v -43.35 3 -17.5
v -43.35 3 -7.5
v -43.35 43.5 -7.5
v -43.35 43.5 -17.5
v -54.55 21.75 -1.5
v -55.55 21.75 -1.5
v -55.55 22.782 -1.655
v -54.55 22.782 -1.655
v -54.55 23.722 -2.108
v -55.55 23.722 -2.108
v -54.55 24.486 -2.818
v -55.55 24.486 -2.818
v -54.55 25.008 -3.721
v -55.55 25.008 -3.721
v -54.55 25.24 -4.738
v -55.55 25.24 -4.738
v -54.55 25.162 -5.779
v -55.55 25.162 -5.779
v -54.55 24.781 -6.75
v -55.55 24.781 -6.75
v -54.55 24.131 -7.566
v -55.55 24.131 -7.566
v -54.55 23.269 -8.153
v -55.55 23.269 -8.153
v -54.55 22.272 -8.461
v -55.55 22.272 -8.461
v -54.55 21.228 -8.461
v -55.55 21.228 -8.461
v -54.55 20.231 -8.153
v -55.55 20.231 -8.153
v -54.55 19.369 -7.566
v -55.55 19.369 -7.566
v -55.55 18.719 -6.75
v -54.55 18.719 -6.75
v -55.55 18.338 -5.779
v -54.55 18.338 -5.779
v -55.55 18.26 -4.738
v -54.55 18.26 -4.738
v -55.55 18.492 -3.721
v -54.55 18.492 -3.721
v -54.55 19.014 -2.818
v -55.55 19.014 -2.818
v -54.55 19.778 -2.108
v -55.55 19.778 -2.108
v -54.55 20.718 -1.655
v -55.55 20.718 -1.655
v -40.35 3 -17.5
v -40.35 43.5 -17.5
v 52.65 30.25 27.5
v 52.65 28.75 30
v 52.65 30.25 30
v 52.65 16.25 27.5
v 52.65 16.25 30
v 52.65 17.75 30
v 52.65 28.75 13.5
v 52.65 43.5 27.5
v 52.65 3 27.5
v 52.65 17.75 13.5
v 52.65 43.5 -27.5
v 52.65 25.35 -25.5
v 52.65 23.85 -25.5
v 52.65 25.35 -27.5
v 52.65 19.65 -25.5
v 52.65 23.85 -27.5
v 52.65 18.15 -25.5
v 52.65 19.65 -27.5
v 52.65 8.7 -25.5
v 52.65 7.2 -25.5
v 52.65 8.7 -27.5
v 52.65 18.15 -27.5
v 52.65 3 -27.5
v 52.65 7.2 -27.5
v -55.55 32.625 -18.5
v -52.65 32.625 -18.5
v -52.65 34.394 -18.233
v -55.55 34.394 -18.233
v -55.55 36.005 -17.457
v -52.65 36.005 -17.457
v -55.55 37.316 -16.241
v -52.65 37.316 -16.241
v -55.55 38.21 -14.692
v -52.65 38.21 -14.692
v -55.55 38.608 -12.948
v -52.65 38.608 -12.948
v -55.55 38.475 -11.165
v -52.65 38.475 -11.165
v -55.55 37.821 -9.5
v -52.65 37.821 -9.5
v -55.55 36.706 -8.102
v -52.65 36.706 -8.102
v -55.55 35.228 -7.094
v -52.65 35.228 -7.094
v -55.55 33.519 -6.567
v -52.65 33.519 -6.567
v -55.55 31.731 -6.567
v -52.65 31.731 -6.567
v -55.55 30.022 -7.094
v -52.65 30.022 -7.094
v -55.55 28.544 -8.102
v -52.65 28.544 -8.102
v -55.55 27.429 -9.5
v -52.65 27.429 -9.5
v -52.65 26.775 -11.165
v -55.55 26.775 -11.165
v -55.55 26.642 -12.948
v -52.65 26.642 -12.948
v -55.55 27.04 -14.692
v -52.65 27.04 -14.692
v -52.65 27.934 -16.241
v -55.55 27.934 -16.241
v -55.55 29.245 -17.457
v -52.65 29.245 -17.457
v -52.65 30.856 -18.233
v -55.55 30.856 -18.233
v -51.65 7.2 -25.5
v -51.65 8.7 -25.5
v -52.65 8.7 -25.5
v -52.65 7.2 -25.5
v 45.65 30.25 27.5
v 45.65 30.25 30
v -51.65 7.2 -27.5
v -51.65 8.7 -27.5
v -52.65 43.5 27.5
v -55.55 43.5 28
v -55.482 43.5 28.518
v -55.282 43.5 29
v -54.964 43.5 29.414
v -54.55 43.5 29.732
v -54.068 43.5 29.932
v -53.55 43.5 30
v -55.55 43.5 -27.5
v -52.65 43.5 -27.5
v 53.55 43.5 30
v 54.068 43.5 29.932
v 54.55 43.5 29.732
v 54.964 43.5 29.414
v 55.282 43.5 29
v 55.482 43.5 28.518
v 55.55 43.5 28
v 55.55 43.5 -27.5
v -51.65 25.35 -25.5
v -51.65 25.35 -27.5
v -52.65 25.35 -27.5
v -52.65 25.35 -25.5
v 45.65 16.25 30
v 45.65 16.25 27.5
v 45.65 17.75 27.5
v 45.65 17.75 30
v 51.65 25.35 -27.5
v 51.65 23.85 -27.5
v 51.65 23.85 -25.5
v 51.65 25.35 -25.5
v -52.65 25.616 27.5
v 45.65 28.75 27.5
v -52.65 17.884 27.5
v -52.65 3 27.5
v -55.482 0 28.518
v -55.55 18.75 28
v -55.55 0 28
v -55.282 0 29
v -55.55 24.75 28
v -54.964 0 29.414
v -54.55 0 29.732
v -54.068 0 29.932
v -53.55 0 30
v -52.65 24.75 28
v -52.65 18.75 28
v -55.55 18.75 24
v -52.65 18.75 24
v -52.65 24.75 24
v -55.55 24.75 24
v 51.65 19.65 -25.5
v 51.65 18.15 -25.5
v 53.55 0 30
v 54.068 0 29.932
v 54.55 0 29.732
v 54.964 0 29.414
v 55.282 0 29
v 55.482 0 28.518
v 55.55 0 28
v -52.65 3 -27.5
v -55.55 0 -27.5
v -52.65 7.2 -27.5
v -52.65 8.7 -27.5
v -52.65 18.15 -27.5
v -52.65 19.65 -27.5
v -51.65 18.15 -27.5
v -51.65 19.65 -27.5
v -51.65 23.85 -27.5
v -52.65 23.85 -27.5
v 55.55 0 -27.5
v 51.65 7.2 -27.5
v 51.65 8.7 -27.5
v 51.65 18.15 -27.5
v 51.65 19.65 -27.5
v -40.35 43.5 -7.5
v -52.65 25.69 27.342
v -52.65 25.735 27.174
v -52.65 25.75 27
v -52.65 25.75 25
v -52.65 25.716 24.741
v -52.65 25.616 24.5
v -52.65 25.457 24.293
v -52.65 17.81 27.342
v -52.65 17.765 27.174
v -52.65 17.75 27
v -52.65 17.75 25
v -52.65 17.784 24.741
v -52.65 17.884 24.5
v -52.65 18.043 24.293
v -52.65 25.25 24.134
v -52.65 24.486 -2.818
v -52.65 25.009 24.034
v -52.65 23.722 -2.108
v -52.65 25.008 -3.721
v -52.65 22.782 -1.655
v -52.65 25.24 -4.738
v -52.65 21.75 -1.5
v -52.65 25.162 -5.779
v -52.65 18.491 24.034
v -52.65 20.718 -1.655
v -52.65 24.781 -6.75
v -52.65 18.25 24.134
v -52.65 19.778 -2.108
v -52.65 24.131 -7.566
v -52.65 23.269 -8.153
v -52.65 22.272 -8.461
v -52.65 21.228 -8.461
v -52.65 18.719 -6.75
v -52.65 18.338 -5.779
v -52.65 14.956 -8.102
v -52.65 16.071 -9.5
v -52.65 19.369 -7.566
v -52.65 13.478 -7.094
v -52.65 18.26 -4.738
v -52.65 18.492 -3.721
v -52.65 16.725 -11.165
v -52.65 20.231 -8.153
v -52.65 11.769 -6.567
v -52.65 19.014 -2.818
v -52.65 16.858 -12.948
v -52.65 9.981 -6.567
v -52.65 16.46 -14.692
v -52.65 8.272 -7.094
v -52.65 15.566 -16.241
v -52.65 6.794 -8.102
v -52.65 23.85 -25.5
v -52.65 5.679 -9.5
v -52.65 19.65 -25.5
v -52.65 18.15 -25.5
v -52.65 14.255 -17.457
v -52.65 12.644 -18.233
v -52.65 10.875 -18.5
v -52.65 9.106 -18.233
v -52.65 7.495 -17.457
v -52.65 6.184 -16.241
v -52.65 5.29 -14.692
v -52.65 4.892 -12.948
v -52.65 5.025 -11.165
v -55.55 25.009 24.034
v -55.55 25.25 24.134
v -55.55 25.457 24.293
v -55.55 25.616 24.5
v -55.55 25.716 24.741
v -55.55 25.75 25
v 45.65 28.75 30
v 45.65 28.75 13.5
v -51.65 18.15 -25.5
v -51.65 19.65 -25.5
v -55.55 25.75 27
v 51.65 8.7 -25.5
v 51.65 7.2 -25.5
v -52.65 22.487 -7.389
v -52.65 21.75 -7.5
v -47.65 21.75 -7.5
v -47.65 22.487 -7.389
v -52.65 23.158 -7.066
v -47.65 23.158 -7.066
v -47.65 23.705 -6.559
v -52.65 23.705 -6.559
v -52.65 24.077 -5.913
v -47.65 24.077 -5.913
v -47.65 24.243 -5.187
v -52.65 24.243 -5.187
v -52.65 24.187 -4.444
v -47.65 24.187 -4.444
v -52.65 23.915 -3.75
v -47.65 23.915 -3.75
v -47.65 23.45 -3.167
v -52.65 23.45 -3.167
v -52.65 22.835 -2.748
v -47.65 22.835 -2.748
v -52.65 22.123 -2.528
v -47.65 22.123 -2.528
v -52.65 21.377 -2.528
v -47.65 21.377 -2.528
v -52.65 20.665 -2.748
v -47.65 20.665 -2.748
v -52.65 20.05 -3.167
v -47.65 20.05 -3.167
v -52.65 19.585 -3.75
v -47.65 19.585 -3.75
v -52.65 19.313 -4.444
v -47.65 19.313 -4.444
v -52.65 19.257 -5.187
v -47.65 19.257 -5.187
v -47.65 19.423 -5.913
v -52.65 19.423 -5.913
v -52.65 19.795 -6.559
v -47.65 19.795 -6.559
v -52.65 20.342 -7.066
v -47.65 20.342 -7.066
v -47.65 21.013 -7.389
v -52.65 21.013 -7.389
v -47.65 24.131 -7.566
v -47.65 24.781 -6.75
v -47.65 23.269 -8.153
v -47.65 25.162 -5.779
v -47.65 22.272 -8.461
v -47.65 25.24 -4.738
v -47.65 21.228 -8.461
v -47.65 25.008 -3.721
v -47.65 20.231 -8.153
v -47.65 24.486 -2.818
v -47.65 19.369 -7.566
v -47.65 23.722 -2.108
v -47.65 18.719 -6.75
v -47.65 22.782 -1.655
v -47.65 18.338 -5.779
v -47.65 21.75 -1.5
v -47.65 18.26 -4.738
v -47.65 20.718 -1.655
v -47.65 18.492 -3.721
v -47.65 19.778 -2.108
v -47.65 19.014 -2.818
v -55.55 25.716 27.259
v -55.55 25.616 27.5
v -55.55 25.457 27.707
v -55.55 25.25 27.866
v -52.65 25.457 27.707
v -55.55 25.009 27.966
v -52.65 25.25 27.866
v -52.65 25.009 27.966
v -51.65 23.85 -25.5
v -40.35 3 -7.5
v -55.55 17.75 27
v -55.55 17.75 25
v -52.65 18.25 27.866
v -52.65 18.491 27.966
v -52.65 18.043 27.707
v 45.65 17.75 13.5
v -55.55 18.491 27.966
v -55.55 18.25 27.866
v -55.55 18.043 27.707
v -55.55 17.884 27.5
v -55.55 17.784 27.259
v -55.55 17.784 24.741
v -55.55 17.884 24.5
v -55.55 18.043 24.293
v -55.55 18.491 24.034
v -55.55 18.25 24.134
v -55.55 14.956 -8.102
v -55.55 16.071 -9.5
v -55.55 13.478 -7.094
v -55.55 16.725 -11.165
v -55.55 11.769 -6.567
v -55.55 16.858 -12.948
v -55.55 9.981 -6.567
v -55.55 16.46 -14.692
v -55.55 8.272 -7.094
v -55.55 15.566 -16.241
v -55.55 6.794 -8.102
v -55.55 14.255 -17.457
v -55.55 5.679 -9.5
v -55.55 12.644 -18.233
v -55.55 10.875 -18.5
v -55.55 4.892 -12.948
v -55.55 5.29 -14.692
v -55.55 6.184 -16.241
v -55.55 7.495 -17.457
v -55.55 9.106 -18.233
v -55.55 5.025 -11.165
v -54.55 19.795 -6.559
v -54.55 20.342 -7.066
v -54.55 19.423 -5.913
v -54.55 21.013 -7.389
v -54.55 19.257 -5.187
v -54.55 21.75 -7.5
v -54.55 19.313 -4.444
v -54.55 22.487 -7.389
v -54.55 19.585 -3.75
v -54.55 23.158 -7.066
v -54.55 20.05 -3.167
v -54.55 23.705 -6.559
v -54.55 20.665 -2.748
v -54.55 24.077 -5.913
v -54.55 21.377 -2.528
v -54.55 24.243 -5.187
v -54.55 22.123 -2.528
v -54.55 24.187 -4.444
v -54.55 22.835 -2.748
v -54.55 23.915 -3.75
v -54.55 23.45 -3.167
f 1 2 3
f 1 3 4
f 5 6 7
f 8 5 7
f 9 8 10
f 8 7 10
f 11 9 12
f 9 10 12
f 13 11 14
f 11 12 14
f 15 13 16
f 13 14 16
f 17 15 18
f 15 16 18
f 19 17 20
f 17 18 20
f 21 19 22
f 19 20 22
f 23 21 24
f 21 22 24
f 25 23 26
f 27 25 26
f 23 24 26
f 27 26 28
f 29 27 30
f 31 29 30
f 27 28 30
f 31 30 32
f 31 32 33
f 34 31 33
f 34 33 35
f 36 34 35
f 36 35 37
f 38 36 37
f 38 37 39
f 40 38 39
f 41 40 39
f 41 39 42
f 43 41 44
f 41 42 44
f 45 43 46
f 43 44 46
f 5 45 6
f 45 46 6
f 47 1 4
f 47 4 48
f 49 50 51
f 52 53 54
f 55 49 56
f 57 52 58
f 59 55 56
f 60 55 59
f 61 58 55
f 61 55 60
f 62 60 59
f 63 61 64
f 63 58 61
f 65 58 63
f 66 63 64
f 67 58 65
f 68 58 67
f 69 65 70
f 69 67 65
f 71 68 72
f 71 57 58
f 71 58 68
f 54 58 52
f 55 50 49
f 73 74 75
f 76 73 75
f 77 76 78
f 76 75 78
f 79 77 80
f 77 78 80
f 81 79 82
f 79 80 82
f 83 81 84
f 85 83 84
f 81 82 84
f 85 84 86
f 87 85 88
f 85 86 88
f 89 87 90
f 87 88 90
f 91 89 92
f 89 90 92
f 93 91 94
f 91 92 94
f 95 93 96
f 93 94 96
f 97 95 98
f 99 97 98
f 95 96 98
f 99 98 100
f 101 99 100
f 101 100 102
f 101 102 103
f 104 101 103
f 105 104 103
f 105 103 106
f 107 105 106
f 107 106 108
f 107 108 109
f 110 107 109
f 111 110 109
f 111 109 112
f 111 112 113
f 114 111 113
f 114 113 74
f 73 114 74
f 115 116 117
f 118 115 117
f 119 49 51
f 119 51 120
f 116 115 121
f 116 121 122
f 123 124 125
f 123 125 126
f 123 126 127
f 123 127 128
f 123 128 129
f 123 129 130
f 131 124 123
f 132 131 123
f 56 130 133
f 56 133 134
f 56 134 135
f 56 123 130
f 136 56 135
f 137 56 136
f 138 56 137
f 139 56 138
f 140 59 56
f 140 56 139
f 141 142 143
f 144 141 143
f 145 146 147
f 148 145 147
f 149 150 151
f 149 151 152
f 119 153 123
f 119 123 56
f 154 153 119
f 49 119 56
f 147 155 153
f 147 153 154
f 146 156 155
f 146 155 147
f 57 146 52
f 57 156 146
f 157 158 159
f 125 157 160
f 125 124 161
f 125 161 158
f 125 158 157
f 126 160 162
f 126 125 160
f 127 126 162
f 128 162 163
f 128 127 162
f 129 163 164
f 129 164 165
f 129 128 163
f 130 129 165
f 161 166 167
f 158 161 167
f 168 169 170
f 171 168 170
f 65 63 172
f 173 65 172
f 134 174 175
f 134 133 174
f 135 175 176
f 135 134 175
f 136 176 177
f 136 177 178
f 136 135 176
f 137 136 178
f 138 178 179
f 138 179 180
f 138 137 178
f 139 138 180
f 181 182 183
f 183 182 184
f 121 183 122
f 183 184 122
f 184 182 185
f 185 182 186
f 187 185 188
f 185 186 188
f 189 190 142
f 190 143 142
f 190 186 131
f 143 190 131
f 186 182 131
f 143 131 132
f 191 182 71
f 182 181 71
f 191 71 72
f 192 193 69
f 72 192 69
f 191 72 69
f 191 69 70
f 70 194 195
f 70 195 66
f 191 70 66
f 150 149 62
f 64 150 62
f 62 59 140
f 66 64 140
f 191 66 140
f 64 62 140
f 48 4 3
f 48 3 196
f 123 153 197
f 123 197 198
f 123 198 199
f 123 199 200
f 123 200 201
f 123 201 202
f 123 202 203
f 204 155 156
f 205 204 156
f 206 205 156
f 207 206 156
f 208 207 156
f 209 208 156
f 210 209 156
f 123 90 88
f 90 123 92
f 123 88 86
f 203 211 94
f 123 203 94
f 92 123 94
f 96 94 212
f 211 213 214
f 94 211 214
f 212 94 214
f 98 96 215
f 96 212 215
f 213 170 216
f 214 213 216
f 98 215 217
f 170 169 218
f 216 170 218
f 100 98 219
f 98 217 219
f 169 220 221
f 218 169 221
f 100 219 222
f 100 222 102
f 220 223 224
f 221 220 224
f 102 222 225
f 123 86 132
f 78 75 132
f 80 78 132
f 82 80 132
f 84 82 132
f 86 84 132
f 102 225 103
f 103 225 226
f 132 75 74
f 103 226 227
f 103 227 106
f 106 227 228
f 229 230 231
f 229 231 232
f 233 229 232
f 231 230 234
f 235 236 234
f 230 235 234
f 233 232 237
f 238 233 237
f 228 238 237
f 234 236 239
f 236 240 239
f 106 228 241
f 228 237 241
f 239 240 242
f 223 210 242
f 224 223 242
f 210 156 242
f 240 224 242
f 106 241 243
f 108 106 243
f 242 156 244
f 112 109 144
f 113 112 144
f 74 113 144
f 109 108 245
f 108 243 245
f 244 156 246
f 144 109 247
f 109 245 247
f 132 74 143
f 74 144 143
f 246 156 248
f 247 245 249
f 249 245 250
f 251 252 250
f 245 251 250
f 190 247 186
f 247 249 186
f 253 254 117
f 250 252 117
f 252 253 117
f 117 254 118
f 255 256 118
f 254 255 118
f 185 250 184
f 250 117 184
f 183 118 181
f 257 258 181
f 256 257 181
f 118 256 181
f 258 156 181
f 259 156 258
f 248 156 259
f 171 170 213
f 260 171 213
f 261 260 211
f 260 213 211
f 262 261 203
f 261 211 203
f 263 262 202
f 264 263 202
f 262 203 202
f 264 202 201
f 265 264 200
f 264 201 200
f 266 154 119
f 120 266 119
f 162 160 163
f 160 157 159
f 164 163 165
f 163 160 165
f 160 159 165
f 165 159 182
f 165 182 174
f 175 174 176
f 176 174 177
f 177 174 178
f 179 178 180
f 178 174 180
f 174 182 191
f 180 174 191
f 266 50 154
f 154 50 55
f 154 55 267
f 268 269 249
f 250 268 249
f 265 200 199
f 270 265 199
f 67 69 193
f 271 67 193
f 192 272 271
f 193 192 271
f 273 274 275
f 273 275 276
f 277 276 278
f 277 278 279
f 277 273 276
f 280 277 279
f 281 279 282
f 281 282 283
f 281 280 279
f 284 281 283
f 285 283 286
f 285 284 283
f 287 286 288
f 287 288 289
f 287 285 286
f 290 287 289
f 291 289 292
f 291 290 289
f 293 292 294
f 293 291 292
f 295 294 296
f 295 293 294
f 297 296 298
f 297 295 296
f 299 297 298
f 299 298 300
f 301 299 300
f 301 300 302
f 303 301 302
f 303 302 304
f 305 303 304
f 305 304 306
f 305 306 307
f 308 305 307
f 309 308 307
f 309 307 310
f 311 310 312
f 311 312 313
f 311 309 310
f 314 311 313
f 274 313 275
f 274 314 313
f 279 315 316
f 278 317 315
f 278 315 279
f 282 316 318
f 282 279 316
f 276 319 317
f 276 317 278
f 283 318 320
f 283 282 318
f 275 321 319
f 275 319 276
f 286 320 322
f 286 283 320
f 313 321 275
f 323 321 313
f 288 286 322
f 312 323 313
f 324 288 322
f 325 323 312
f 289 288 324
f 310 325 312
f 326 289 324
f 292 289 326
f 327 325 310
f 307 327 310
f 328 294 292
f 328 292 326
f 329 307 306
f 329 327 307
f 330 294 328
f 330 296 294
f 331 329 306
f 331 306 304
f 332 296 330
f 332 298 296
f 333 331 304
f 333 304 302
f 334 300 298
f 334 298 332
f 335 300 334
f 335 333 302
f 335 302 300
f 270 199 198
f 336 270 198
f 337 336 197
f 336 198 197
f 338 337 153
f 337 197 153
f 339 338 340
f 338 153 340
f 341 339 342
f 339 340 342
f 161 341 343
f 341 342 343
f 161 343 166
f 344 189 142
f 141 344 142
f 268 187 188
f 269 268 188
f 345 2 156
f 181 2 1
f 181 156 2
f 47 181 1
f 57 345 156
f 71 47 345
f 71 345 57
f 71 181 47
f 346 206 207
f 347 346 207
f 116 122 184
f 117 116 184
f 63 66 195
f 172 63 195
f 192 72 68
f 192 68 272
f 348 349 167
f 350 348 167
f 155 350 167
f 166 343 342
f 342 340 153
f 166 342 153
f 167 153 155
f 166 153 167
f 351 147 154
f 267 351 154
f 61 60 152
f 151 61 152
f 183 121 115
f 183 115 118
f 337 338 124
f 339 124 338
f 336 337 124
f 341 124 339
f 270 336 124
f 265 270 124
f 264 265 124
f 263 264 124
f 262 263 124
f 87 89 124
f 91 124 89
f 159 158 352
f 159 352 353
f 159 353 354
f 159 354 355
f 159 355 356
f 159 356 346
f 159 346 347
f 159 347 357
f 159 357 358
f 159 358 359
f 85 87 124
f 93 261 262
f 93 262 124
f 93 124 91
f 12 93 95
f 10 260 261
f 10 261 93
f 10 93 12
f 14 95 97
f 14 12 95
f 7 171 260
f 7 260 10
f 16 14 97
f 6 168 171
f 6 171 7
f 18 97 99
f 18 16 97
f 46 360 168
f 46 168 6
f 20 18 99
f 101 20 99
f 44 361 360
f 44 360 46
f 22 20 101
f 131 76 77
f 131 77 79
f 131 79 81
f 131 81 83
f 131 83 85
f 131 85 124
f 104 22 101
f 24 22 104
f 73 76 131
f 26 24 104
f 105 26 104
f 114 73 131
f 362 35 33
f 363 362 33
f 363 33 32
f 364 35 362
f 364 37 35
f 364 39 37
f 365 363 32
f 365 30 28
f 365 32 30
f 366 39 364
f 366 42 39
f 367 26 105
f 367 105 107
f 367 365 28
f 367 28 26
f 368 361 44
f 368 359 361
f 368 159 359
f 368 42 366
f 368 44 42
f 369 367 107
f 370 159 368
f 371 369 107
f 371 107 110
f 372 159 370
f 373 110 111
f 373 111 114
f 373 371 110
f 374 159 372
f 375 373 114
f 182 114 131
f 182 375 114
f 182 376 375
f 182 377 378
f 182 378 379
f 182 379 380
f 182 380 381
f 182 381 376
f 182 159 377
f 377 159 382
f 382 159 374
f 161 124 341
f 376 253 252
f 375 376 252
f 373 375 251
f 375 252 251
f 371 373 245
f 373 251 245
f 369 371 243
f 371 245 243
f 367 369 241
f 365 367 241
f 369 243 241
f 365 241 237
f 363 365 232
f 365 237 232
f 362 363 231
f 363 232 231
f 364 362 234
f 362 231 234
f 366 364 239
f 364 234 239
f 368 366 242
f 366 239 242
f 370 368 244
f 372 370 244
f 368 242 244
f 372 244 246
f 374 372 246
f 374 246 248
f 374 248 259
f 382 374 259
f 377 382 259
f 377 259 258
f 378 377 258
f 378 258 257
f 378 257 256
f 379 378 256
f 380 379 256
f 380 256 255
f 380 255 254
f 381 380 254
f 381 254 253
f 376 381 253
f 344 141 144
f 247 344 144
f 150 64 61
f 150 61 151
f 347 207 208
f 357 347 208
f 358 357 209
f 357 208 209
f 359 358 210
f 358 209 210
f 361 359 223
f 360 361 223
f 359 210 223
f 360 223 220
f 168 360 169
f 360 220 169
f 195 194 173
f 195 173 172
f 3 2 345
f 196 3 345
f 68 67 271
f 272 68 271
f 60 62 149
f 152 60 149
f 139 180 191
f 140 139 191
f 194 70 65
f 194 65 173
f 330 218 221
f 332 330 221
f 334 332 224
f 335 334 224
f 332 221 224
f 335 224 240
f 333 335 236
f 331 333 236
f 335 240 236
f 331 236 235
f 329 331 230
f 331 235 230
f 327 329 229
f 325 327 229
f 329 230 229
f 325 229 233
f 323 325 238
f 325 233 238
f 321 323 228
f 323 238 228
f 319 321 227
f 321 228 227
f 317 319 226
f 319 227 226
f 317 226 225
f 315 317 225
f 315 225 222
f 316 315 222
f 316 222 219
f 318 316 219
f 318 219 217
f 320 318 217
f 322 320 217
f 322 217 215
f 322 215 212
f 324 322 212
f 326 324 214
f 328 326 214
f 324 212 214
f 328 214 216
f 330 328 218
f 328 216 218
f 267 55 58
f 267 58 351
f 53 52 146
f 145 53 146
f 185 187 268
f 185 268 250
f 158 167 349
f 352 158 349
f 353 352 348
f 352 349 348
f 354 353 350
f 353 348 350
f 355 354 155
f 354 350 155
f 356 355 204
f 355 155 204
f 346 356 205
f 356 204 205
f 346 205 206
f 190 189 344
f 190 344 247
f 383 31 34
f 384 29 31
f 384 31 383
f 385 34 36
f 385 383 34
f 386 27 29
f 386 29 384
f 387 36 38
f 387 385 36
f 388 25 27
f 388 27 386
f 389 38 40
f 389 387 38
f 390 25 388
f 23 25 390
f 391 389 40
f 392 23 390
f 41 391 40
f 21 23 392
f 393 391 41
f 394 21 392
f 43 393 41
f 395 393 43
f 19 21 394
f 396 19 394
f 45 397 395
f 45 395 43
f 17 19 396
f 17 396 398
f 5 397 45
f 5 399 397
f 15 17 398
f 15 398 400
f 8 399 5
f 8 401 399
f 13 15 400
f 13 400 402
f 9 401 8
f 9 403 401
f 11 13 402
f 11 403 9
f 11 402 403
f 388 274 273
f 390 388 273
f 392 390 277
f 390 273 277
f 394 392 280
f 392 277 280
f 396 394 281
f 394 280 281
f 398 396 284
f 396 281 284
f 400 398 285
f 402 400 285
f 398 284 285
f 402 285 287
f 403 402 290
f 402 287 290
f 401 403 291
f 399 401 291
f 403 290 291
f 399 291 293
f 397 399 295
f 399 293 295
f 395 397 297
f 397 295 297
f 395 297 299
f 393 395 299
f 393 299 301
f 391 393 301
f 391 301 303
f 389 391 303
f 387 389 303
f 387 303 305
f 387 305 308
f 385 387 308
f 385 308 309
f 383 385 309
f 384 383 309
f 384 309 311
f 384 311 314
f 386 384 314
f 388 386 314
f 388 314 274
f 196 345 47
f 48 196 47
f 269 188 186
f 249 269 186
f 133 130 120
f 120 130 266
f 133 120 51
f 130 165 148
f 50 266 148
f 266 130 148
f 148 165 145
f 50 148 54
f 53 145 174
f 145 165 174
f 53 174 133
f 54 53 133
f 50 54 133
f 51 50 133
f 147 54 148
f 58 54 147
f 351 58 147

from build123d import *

# Parameters (mm, degrees)
SKETCH1_W            = 111.1
SKETCH1_H            = 60
BOSS_EXTRUDE1_DEPTH  = 3
SKETCH2_W            = 111.1
SKETCH2_H            = 60
SKETCH2_W_2          = 105.3
SKETCH2_H_2          = 55
BOSS_EXTRUDE2_DEPTH  = 40.5
SKETCH5_R            = 21
BOSS_EXTRUDE4_DEPTH  = 15
SKETCH6_W            = 15.5
SKETCH6_H            = 37
CUT_EXTRUDE1_DEPTH   = 21
BOSS_EXTRUDE5_START  = -1
SKETCH8_R            = 21
SKETCH8_W            = 12.3
SKETCH8_H            = 34.3
BOSS_EXTRUDE5_DEPTH  = 1
BOSS_EXTRUDE6_START  = -1
SKETCH9_R            = 21
SKETCH9_W            = 12.3
SKETCH9_H            = 34.3
BOSS_EXTRUDE6_DEPTH  = 1
SKETCH10_W           = 126.244554882
SKETCH10_H           = 68.697179438
CUT_EXTRUDE3_DEPTH   = 53
SKETCH12_W           = 1
SKETCH12_H           = 1.5
BOSS_EXTRUDE8_DEPTH  = 2
FILLET1_R            = 2
SKETCH13_R           = 6
SKETCH13_R_2         = 2.5
CUT_EXTRUDE4_DEPTH   = 14
SKETCH15_W           = 3
SKETCH15_H           = 10
BOSS_EXTRUDE9_DEPTH  = 40.5
SKETCH16_R           = 3.5
CUT_EXTRUDE5_DEPTH   = 1
SKETCH17_W           = 7
SKETCH17_H           = 11
BOSS_EXTRUDE10_DEPTH = 14
SKETCH18_W           = 7
SKETCH18_H           = 1.5
CUT_EXTRUDE6_DEPTH   = 14
SKETCH19_R           = 3.5
SKETCH19_R_2         = 2.5
BOSS_EXTRUDE11_DEPTH = 5


with BuildPart() as part:
    # Sketch1 → Boss-Extrude1 (new body)
    with BuildSketch(Plane(origin=(0, 0, 0), x_dir=(1, 0, 0), z_dir=(0, 1, 0))):
        Rectangle(SKETCH1_W, SKETCH1_H)
    extrude(amount=BOSS_EXTRUDE1_DEPTH)

    # Sketch2 → Boss-Extrude2 (add)
    with BuildSketch(Plane(origin=(0, 3, 0), x_dir=(1, 0, 0), z_dir=(0, 1, 0))):
        Rectangle(SKETCH2_W, SKETCH2_H)
        Rectangle(SKETCH2_W_2, SKETCH2_H_2, mode=Mode.SUBTRACT)
    extrude(amount=BOSS_EXTRUDE2_DEPTH)

    # Sketch5 → Boss-Extrude4 (add)
    with BuildSketch(Plane(origin=(0, 0, -30), x_dir=(-1, 0, 0), z_dir=(0, 0, -1))):
        with Locations((-27.775, 21.75)):
            Circle(SKETCH5_R)
        with Locations(Location((27.775, 21.75, 0), (0, 0, 180))):
            Circle(SKETCH5_R)
    extrude(amount=BOSS_EXTRUDE4_DEPTH)

    # Sketch6 → Cut-Extrude1 (cut)
    with BuildSketch(Plane(origin=(0, 0, -45), x_dir=(-1, 0, 0), z_dir=(0, 0, -1))):
        with Locations((-27.775, 21.75)):
            Rectangle(SKETCH6_W, SKETCH6_H)
        with Locations((27.775, 21.75)):
            Rectangle(SKETCH6_W, SKETCH6_H)
    extrude(amount=-CUT_EXTRUDE1_DEPTH, mode=Mode.SUBTRACT)

    # Sketch8 → Boss-Extrude5 (add)
    with BuildSketch(Plane(origin=(0, 0, -45), x_dir=(-1, 0, 0), z_dir=(0, 0, -1)).offset(BOSS_EXTRUDE5_START)):
        with Locations((-27.775, 21.75)):
            Circle(SKETCH8_R)
        with Locations((-27.775, 21.75)):
            Rectangle(SKETCH8_W, SKETCH8_H, mode=Mode.SUBTRACT)
    extrude(amount=BOSS_EXTRUDE5_DEPTH)

    # Sketch9 → Boss-Extrude6 (add)
    with BuildSketch(Plane(origin=(0, 0, -45), x_dir=(-1, 0, 0), z_dir=(0, 0, -1)).offset(BOSS_EXTRUDE6_START)):
        with Locations(Location((27.775, 21.75, 0), (0, 0, 180))):
            Circle(SKETCH9_R)
        with Locations((27.775, 21.75)):
            Rectangle(SKETCH9_W, SKETCH9_H, mode=Mode.SUBTRACT)
    extrude(amount=BOSS_EXTRUDE6_DEPTH)

    # Sketch10 → Cut-Extrude3 (cut)
    with BuildSketch(Plane.XY.offset(-27.5)):
        with Locations((0, 21.75)):
            Rectangle(SKETCH10_W, SKETCH10_H)
    extrude(amount=-CUT_EXTRUDE3_DEPTH, mode=Mode.SUBTRACT)

    # Sketch12 → Boss-Extrude8 (add)
    with BuildSketch(Plane(origin=(0, 0, -27.5), x_dir=(-1, 0, 0), z_dir=(0, 0, -1))):
        with Locations((52.15, 18.9)):
            Rectangle(SKETCH12_W, SKETCH12_H)
        with Locations((52.15, 7.95)):
            Rectangle(SKETCH12_W, SKETCH12_H)
        with Locations((-52.15, 18.9)):
            Rectangle(SKETCH12_W, SKETCH12_H)
        with Locations((-52.15, 24.6)):
            Rectangle(SKETCH12_W, SKETCH12_H)
        with Locations((52.15, 24.6)):
            Rectangle(SKETCH12_W, SKETCH12_H)
        with Locations((-52.15, 7.95)):
            Rectangle(SKETCH12_W, SKETCH12_H)
    extrude(amount=-BOSS_EXTRUDE8_DEPTH)

    # Fillet1
    fillet1_edges = [part.edges().sort_by_distance(p)[0] for p in [
        (55.55, 21.75, 30),
        (-55.55, 21.75, 30),
    ]]
    fillet(fillet1_edges, radius=FILLET1_R)

    # Sketch13 → Cut-Extrude4 (cut)
    with BuildSketch(Plane(origin=(-52.65, 0, 0), x_dir=(0, 0, -1), z_dir=(1, 0, 0))):
        with Locations((12.5, 32.625)):
            Circle(SKETCH13_R)
        with Locations((12.5, 10.875)):
            Circle(SKETCH13_R)
        with Locations((5, 21.75)):
            Circle(SKETCH13_R_2)
        with BuildLine():
            Line((-25, 25.75), (-27, 25.75))
            ThreePointArc((-27, 25.75), (-27.707106781, 25.457106781), (-28, 24.75))
            Line((-28, 24.75), (-28, 18.75))
            ThreePointArc((-28, 18.75), (-27.707106781, 18.042893219), (-27, 17.75))
            Line((-27, 17.75), (-25, 17.75))
            ThreePointArc((-25, 17.75), (-24.292893219, 18.042893219), (-24, 18.75))
            Line((-24, 18.75), (-24, 24.75))
            ThreePointArc((-24, 24.75), (-24.292893219, 25.457106781), (-25, 25.75))
        make_face()
    extrude(amount=-CUT_EXTRUDE4_DEPTH, mode=Mode.SUBTRACT)

    # Sketch15 → Boss-Extrude9 (add)
    with BuildSketch(Plane(origin=(0, 3, 0), x_dir=(1, 0, 0), z_dir=(0, 1, 0))):
        with Locations((-41.85, 12.5)):
            Rectangle(SKETCH15_W, SKETCH15_H)
    extrude(amount=BOSS_EXTRUDE9_DEPTH)

    # Sketch16 → Cut-Extrude5 (cut)
    with BuildSketch(Plane.ZY.offset(55.55)):
        with Locations((-5, 21.75)):
            Circle(SKETCH16_R)
    extrude(amount=-CUT_EXTRUDE5_DEPTH, mode=Mode.SUBTRACT)

    # Sketch17 → Boss-Extrude10 (add)
    with BuildSketch(Plane(origin=(0, 0, 27.5), x_dir=(-1, 0, 0), z_dir=(0, 0, -1))):
        with Locations((-49.15, 23.25)):
            Rectangle(SKETCH17_W, SKETCH17_H)
    extrude(amount=BOSS_EXTRUDE10_DEPTH)

    # Sketch18 → Cut-Extrude6 (cut)
    with BuildSketch(Plane(origin=(0, 0, 27.5), x_dir=(-1, 0, 0), z_dir=(0, 0, -1))):
        with Locations((-49.15, 29.5)):
            Rectangle(SKETCH18_W, SKETCH18_H)
        with Locations((-49.15, 17)):
            Rectangle(SKETCH18_W, SKETCH18_H)
    extrude(amount=-CUT_EXTRUDE6_DEPTH, mode=Mode.SUBTRACT)

    # Sketch19 → Boss-Extrude11 (add)
    with BuildSketch(Plane(origin=(-52.65, 0, 0), x_dir=(0, 0, -1), z_dir=(1, 0, 0))):
        with Locations(Location((5, 21.75, 0), (0, 0, 180))):
            Circle(SKETCH19_R)
        with Locations((5, 21.75)):
            Circle(SKETCH19_R_2, mode=Mode.SUBTRACT)
    extrude(amount=BOSS_EXTRUDE11_DEPTH)


solid = part.part
